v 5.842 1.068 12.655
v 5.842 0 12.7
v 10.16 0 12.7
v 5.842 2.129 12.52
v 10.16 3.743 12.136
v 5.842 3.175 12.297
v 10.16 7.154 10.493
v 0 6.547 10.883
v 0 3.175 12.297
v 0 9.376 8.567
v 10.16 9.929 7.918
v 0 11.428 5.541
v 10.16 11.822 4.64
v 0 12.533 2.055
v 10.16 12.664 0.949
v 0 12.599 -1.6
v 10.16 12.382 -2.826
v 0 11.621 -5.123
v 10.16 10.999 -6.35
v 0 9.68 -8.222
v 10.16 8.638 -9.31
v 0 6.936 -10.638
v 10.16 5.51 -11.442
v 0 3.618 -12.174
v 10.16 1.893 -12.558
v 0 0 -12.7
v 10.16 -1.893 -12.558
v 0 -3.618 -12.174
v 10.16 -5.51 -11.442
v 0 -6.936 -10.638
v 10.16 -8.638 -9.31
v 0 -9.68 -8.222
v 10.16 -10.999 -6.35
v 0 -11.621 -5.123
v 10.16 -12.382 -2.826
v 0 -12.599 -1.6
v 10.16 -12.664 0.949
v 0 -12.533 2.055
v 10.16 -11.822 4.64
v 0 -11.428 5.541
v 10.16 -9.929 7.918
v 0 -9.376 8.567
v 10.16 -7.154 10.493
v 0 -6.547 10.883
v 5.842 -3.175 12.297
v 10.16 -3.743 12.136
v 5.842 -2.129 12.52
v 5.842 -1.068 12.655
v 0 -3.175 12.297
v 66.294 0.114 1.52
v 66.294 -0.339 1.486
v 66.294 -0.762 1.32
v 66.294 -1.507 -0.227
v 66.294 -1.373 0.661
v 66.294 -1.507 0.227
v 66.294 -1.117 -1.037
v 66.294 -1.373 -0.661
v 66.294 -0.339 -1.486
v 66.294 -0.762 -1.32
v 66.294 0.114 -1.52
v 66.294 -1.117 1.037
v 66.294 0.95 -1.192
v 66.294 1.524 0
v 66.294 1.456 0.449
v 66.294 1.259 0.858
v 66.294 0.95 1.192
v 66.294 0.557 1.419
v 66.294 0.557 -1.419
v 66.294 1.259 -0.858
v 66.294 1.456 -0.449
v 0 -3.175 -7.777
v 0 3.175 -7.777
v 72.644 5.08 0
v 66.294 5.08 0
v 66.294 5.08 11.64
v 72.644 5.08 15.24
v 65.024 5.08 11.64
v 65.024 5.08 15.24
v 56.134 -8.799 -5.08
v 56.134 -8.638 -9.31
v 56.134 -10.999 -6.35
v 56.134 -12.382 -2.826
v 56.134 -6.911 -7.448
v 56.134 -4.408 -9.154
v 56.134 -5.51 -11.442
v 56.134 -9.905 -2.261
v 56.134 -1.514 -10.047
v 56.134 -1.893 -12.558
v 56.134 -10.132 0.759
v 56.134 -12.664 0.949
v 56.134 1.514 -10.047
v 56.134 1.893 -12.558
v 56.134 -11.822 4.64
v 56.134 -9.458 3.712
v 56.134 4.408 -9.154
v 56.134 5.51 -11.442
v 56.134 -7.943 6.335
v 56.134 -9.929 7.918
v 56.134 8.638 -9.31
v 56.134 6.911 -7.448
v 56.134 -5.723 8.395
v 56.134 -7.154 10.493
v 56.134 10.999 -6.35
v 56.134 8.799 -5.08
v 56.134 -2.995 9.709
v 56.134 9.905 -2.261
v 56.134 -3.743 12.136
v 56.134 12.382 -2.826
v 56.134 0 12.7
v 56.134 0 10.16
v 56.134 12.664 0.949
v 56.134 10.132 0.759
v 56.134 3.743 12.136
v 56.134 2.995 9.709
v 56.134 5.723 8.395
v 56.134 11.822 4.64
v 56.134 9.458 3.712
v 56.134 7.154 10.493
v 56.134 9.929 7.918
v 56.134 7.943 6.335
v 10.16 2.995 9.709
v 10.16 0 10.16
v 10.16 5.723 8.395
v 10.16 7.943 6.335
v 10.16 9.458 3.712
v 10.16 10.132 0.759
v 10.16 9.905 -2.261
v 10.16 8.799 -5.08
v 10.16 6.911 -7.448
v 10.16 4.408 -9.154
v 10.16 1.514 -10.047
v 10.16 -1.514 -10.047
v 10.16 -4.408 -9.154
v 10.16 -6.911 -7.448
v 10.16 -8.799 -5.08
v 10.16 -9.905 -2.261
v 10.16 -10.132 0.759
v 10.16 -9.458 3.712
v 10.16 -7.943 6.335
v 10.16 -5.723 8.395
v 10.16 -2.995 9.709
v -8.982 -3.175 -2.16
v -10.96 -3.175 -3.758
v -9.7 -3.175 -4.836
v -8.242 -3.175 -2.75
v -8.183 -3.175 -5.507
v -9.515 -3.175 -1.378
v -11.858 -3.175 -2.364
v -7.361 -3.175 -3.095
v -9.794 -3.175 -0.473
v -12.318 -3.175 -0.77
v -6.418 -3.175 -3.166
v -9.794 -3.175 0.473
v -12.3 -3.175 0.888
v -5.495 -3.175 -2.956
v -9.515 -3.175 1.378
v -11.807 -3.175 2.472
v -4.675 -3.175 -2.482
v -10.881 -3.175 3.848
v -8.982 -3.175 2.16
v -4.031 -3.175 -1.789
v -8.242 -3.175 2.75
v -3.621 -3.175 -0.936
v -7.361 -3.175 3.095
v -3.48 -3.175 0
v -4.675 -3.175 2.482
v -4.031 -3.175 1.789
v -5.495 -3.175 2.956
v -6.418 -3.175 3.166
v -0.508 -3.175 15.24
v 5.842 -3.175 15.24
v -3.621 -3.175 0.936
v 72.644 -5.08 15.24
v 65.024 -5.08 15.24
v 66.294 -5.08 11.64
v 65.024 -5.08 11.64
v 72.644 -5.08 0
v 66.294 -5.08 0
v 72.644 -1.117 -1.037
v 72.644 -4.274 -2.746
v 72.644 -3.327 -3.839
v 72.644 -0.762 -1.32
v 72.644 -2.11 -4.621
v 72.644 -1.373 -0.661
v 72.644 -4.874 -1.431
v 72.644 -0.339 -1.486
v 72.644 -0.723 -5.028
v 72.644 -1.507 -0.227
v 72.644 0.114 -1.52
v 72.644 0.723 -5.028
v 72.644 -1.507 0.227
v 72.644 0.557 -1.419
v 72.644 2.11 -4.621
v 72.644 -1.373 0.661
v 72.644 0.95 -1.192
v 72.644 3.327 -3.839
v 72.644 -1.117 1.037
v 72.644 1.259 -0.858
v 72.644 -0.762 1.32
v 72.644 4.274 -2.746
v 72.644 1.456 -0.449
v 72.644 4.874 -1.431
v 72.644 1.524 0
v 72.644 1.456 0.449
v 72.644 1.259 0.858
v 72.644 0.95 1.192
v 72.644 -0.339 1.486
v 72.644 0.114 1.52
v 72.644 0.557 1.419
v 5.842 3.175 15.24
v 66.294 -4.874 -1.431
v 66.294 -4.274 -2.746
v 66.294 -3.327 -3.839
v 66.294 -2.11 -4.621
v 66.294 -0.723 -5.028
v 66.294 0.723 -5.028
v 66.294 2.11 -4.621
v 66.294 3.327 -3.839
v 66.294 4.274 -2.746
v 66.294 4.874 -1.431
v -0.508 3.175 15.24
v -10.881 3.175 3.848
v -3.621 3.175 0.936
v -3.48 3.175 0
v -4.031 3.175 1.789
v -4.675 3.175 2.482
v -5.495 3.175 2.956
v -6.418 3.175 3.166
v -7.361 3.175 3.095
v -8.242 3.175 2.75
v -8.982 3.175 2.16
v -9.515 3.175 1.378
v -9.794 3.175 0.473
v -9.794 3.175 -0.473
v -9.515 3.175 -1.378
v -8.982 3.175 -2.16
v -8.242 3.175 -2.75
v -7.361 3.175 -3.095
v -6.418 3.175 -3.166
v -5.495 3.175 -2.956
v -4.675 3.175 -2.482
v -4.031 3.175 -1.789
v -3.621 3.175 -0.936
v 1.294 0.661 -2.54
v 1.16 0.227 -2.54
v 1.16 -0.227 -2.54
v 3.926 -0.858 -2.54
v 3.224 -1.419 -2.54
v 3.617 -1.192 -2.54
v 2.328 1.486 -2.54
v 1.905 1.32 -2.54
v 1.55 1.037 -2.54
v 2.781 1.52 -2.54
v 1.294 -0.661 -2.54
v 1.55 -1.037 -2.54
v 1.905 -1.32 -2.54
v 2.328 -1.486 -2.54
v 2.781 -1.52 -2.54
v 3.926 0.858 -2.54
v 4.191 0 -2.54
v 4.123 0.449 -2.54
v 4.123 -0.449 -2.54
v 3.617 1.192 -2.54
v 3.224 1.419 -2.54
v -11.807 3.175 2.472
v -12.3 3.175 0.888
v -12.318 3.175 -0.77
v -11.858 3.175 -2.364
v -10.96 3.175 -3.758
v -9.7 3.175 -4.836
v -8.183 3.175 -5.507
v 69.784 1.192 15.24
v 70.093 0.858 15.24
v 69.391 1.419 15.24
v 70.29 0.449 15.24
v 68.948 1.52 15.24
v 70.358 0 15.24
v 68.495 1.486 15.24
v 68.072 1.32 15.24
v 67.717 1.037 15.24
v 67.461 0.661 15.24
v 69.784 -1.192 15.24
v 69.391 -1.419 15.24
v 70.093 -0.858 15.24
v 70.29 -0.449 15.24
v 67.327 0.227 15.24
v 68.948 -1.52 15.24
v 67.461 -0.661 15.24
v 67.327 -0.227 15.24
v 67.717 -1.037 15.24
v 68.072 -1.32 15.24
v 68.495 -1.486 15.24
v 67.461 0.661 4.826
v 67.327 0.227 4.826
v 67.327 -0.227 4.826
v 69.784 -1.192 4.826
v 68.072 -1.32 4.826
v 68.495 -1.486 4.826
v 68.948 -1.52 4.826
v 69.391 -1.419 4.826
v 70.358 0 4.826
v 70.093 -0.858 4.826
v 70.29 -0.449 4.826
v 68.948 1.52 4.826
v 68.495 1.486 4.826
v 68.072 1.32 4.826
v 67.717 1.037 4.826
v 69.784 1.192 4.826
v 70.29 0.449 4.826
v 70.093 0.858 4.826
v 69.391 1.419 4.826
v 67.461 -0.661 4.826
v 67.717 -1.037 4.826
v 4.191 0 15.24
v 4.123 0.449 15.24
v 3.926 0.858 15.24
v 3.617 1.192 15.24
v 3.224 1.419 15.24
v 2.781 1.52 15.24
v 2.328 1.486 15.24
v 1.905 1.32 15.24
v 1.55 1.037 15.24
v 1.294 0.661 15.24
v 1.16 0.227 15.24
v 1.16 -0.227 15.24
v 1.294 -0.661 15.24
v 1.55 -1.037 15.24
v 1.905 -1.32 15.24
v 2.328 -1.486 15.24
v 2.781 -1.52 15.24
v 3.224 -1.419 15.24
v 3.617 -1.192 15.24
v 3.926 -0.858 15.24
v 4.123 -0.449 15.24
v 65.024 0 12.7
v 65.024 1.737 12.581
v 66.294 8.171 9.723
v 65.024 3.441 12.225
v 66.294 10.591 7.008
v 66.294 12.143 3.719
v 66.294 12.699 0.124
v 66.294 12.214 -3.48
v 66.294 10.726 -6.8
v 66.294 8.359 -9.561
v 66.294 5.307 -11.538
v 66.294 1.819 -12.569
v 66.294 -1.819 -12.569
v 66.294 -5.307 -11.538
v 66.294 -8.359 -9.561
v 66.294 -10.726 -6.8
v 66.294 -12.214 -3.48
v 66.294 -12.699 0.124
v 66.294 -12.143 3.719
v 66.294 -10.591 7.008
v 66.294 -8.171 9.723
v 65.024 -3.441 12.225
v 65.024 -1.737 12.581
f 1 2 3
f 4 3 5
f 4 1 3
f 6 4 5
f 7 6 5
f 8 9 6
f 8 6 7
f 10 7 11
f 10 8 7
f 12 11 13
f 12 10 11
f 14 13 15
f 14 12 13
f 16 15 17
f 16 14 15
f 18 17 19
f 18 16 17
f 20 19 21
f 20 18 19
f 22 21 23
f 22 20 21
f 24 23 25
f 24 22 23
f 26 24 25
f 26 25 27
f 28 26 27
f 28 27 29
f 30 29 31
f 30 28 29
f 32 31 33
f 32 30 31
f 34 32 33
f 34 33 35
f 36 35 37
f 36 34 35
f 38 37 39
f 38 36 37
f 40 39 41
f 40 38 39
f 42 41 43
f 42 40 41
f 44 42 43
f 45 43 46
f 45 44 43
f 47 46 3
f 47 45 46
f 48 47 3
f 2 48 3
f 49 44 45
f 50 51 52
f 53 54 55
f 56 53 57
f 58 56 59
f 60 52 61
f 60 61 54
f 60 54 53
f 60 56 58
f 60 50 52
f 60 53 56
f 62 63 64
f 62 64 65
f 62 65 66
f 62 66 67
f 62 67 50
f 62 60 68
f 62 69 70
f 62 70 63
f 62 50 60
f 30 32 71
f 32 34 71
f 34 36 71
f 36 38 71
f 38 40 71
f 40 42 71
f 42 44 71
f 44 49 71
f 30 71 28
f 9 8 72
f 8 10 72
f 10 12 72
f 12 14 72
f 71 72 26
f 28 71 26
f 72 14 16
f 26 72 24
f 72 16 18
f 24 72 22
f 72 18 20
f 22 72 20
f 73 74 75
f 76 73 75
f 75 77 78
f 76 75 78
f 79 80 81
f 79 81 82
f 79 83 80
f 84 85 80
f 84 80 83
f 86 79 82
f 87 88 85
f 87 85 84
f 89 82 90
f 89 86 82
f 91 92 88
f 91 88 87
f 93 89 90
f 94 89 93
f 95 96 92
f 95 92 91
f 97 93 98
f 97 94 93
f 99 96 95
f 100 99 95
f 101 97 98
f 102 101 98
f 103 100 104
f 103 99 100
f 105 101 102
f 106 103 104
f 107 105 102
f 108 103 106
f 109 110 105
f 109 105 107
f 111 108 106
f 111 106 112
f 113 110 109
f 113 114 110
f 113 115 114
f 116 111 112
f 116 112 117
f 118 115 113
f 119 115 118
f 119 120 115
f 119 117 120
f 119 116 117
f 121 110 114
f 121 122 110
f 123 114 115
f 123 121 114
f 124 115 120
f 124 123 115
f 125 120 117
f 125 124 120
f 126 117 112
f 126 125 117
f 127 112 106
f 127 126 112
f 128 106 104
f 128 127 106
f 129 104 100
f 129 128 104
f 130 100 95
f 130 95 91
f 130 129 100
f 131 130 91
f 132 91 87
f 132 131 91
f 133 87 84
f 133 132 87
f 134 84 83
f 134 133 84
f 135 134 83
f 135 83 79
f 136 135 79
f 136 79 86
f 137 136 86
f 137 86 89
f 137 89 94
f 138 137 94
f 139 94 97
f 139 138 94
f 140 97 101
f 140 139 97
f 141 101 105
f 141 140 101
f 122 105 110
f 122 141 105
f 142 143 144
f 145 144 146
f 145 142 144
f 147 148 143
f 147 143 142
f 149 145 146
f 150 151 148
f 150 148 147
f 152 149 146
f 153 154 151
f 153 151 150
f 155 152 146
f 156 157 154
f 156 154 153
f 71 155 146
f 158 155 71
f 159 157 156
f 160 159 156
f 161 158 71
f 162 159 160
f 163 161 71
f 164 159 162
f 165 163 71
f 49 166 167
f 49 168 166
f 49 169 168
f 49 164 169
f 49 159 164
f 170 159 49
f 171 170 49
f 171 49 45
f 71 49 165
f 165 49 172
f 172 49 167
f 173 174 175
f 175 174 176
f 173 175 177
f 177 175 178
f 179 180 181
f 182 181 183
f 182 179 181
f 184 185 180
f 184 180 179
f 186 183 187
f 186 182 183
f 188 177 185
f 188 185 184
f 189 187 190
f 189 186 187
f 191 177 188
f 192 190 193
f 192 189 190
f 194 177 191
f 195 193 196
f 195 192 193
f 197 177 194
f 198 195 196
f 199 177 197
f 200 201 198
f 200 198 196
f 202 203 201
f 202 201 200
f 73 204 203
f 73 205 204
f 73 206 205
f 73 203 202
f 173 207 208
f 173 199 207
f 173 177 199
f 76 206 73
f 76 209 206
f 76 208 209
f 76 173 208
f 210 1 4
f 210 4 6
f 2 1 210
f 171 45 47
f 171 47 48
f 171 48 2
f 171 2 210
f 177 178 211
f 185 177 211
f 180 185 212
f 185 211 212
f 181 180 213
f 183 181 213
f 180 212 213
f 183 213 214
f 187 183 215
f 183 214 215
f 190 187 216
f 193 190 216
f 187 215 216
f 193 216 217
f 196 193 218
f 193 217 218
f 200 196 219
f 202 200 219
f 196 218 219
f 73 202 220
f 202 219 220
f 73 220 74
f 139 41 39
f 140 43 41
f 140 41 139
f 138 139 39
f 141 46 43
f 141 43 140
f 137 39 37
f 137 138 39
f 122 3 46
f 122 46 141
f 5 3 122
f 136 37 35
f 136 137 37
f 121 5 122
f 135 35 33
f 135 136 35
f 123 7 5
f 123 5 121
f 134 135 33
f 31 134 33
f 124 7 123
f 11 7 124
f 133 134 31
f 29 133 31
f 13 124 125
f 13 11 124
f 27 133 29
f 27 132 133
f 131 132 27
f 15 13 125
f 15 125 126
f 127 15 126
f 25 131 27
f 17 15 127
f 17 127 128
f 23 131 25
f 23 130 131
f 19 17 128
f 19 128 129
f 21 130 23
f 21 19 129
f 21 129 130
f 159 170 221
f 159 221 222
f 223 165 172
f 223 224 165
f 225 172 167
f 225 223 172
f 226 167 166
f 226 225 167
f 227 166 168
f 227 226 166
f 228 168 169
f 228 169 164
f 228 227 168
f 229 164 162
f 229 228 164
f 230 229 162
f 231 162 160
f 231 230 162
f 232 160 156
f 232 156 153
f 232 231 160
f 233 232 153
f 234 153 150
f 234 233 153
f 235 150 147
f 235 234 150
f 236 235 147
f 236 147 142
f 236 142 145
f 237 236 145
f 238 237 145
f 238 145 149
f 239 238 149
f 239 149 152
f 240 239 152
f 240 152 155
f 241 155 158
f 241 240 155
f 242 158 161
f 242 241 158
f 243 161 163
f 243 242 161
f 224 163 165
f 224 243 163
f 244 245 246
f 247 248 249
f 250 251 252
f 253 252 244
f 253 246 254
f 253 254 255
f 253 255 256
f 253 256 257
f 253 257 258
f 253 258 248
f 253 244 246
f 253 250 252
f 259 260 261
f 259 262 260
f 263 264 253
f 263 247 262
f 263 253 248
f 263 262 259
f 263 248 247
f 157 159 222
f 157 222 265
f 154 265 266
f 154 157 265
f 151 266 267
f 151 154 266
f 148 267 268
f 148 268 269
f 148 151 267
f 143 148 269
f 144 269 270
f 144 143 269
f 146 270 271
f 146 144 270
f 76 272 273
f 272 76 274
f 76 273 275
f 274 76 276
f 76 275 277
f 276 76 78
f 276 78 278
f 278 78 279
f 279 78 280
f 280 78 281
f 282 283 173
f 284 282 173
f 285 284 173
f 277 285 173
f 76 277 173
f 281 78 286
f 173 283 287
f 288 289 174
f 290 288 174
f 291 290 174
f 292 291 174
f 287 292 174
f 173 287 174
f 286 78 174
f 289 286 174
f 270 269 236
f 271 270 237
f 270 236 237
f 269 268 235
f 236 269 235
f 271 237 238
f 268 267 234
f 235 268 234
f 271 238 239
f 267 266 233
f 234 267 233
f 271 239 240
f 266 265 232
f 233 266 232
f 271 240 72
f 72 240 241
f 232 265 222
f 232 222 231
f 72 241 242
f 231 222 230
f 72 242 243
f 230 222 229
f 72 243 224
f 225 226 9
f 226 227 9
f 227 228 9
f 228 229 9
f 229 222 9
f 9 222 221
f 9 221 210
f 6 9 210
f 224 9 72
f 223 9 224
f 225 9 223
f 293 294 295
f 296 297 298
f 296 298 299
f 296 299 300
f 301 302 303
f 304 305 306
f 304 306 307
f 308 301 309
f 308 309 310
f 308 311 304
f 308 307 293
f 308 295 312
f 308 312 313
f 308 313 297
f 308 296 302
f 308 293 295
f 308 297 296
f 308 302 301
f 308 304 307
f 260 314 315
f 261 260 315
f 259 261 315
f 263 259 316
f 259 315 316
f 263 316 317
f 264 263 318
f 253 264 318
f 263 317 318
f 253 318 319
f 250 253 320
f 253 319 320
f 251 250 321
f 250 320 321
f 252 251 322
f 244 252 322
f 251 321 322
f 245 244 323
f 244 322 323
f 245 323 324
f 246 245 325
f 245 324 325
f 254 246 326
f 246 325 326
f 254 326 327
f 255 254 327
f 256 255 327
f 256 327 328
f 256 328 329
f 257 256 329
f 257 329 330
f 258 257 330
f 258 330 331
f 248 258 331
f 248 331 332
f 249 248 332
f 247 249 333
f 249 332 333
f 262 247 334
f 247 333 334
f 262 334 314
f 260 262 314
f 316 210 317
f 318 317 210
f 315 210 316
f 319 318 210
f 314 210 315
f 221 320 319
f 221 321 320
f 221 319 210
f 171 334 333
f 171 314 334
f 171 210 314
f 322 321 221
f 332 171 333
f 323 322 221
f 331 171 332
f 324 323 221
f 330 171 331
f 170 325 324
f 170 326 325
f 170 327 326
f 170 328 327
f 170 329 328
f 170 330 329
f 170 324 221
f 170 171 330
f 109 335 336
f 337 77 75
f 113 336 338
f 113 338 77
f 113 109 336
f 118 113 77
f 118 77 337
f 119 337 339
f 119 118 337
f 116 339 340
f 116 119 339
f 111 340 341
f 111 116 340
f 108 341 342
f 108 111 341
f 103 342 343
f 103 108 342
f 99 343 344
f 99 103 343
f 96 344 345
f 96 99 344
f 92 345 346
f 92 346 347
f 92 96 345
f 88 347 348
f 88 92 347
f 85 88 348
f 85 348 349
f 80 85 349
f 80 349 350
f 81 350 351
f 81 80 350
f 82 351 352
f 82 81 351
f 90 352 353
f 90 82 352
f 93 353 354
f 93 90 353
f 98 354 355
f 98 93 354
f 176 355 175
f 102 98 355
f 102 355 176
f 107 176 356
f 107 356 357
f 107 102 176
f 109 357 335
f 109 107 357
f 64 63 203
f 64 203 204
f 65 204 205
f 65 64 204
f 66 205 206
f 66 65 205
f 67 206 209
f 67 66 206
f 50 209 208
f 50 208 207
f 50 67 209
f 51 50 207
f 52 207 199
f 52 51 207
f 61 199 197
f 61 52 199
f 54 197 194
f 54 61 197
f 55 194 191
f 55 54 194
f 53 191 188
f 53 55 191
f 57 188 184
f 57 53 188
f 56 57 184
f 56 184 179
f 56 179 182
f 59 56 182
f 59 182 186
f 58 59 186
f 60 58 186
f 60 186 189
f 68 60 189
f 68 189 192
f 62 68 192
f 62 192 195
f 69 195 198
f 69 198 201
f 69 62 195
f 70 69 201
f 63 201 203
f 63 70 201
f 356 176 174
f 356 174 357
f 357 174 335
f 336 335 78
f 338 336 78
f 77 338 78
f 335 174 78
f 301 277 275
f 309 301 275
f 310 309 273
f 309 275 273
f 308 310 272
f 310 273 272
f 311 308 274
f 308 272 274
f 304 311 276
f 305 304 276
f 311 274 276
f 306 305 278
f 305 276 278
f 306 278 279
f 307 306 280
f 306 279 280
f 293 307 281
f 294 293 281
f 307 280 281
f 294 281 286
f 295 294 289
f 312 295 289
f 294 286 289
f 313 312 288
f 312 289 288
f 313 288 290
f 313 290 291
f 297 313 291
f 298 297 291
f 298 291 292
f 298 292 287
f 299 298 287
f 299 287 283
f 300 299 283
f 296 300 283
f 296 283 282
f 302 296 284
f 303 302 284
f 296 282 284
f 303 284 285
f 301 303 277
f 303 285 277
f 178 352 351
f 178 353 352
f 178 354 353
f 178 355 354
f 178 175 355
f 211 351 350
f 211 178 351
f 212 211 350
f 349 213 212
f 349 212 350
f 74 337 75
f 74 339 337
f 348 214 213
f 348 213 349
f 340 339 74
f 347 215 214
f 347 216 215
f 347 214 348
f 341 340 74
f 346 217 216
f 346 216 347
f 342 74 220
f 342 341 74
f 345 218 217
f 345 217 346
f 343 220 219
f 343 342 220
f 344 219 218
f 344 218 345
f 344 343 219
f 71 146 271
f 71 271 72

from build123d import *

# Parameters (mm, degrees)
F0_W          = 5.842
F0_H          = 12.7
F0_R          = 3.175
F2_DEPTH      = 3.175
F3_R          = 1.524
F4_DEPTH      = 1.27
F4_DEPTH_BACK = 6.35
F5_R          = 1.524
F6_DEPTH      = 10.414
F7_R          = 1.524
F8_DEPTH      = 17.78
F9_DEPTH      = 56.134


with BuildPart() as f1:
    # F0 (on Front) → F1 (revolve)
    with BuildSketch(Plane.XZ):
        Polygon((5.842, 12.7), (5.842, 0), (66.294, 0), (66.294, 12.7), (56.134, 12.7), (56.134, 10.16), (10.16, 10.16), (10.16, 12.7), align=None)
        with Locations((2.921, 6.35)):
            Rectangle(F0_W, F0_H)
    revolve(axis=Axis((33.147, 0, 0), (-1, 0, 0)))

    # F0 (on Front) → F2 (join, symmetric)
    with BuildSketch(Plane.XZ):
        with Locations((2.921, 6.35)):
            Rectangle(F0_W, F0_H)
        with BuildLine():
            Line((-0.9398, 0), (0, 0))
            Line((0, 0), (0, 12.7))
            Line((0, 12.7), (5.842, 12.7))
            Line((5.842, 12.7), (5.842, 15.24))
            Line((5.842, 15.24), (-0.508, 15.24))
            Line((-0.508, 15.24), (-10.8806298187, 3.8475430269))
            ThreePointArc((-10.8806298187, 3.8475430269), (-4.5919612295, 5.3297205562), (-0.9398, 0))
        make_face()
        with BuildLine():
            ThreePointArc((-8.1826630726, -5.5069827884), (-3.1957909266, -4.5493385486), (-0.9398, 0))
            ThreePointArc((-0.9398, 0), (-4.5919612295, 5.3297205562), (-10.8806298187, 3.8475430269))
            ThreePointArc((-10.8806298187, 3.8475430269), (-12.1459778134, -1.5837270034), (-8.1826630726, -5.5069827884))
        make_face()
        with Locations((-6.6548, 0)):
            Circle(F0_R, mode=Mode.SUBTRACT)
        with BuildLine():
            Line((5.842, 0), (0, 0))
            Line((0, 0), (-0.9398, 0))
            ThreePointArc((-0.9398, 0), (-3.1957909266, -4.5493385486), (-8.1826630726, -5.5069827884))
            Line((-8.1826630726, -5.5069827884), (5.842, -9.398))
            Line((5.842, -9.398), (5.842, 0))
        make_face()
    extrude(amount=F2_DEPTH, both=True)

    # F3 (on face) → F4 (join, two sides)
    with BuildSketch(Plane.YZ.offset(66.294)) as f4_sk:
        with BuildLine():
            ThreePointArc((-5.08, 0), (0, -5.08), (5.08, 0))
            ThreePointArc((5.08, 0), (0, 5.08), (-5.08, 0))
        make_face()
        Circle(F3_R, mode=Mode.SUBTRACT)
        with BuildLine():
            ThreePointArc((-5.08, 0), (0, 5.08), (5.08, 0))
            Line((5.08, 0), (5.08, 15.24))
            Line((5.08, 15.24), (-5.08, 15.24))
            Line((-5.08, 15.24), (-5.08, 0))
        make_face()
    extrude(amount=-F4_DEPTH)
    extrude(f4_sk.sketch, amount=F4_DEPTH_BACK)

    # F5 (on face) → F6 (cut)
    with BuildSketch(Plane.XY.offset(15.24)):
        with Locations((68.834, 0)):
            Circle(F5_R)
    extrude(amount=-F6_DEPTH, mode=Mode.SUBTRACT)

    # F7 (on face) → F8 (cut)
    with BuildSketch(Plane.XY.offset(15.24)):
        with Locations((2.667, 0)):
            Circle(F7_R)
    extrude(amount=-F8_DEPTH, mode=Mode.SUBTRACT)

    # F9 (add, through all): a face of the model
    f9_faces = [f1.faces().sort_by_distance(p)[0] for p in [
        (66.294, 0, 0),
    ]]
    extrude(f9_faces, amount=-F9_DEPTH)


solid = f1.part
